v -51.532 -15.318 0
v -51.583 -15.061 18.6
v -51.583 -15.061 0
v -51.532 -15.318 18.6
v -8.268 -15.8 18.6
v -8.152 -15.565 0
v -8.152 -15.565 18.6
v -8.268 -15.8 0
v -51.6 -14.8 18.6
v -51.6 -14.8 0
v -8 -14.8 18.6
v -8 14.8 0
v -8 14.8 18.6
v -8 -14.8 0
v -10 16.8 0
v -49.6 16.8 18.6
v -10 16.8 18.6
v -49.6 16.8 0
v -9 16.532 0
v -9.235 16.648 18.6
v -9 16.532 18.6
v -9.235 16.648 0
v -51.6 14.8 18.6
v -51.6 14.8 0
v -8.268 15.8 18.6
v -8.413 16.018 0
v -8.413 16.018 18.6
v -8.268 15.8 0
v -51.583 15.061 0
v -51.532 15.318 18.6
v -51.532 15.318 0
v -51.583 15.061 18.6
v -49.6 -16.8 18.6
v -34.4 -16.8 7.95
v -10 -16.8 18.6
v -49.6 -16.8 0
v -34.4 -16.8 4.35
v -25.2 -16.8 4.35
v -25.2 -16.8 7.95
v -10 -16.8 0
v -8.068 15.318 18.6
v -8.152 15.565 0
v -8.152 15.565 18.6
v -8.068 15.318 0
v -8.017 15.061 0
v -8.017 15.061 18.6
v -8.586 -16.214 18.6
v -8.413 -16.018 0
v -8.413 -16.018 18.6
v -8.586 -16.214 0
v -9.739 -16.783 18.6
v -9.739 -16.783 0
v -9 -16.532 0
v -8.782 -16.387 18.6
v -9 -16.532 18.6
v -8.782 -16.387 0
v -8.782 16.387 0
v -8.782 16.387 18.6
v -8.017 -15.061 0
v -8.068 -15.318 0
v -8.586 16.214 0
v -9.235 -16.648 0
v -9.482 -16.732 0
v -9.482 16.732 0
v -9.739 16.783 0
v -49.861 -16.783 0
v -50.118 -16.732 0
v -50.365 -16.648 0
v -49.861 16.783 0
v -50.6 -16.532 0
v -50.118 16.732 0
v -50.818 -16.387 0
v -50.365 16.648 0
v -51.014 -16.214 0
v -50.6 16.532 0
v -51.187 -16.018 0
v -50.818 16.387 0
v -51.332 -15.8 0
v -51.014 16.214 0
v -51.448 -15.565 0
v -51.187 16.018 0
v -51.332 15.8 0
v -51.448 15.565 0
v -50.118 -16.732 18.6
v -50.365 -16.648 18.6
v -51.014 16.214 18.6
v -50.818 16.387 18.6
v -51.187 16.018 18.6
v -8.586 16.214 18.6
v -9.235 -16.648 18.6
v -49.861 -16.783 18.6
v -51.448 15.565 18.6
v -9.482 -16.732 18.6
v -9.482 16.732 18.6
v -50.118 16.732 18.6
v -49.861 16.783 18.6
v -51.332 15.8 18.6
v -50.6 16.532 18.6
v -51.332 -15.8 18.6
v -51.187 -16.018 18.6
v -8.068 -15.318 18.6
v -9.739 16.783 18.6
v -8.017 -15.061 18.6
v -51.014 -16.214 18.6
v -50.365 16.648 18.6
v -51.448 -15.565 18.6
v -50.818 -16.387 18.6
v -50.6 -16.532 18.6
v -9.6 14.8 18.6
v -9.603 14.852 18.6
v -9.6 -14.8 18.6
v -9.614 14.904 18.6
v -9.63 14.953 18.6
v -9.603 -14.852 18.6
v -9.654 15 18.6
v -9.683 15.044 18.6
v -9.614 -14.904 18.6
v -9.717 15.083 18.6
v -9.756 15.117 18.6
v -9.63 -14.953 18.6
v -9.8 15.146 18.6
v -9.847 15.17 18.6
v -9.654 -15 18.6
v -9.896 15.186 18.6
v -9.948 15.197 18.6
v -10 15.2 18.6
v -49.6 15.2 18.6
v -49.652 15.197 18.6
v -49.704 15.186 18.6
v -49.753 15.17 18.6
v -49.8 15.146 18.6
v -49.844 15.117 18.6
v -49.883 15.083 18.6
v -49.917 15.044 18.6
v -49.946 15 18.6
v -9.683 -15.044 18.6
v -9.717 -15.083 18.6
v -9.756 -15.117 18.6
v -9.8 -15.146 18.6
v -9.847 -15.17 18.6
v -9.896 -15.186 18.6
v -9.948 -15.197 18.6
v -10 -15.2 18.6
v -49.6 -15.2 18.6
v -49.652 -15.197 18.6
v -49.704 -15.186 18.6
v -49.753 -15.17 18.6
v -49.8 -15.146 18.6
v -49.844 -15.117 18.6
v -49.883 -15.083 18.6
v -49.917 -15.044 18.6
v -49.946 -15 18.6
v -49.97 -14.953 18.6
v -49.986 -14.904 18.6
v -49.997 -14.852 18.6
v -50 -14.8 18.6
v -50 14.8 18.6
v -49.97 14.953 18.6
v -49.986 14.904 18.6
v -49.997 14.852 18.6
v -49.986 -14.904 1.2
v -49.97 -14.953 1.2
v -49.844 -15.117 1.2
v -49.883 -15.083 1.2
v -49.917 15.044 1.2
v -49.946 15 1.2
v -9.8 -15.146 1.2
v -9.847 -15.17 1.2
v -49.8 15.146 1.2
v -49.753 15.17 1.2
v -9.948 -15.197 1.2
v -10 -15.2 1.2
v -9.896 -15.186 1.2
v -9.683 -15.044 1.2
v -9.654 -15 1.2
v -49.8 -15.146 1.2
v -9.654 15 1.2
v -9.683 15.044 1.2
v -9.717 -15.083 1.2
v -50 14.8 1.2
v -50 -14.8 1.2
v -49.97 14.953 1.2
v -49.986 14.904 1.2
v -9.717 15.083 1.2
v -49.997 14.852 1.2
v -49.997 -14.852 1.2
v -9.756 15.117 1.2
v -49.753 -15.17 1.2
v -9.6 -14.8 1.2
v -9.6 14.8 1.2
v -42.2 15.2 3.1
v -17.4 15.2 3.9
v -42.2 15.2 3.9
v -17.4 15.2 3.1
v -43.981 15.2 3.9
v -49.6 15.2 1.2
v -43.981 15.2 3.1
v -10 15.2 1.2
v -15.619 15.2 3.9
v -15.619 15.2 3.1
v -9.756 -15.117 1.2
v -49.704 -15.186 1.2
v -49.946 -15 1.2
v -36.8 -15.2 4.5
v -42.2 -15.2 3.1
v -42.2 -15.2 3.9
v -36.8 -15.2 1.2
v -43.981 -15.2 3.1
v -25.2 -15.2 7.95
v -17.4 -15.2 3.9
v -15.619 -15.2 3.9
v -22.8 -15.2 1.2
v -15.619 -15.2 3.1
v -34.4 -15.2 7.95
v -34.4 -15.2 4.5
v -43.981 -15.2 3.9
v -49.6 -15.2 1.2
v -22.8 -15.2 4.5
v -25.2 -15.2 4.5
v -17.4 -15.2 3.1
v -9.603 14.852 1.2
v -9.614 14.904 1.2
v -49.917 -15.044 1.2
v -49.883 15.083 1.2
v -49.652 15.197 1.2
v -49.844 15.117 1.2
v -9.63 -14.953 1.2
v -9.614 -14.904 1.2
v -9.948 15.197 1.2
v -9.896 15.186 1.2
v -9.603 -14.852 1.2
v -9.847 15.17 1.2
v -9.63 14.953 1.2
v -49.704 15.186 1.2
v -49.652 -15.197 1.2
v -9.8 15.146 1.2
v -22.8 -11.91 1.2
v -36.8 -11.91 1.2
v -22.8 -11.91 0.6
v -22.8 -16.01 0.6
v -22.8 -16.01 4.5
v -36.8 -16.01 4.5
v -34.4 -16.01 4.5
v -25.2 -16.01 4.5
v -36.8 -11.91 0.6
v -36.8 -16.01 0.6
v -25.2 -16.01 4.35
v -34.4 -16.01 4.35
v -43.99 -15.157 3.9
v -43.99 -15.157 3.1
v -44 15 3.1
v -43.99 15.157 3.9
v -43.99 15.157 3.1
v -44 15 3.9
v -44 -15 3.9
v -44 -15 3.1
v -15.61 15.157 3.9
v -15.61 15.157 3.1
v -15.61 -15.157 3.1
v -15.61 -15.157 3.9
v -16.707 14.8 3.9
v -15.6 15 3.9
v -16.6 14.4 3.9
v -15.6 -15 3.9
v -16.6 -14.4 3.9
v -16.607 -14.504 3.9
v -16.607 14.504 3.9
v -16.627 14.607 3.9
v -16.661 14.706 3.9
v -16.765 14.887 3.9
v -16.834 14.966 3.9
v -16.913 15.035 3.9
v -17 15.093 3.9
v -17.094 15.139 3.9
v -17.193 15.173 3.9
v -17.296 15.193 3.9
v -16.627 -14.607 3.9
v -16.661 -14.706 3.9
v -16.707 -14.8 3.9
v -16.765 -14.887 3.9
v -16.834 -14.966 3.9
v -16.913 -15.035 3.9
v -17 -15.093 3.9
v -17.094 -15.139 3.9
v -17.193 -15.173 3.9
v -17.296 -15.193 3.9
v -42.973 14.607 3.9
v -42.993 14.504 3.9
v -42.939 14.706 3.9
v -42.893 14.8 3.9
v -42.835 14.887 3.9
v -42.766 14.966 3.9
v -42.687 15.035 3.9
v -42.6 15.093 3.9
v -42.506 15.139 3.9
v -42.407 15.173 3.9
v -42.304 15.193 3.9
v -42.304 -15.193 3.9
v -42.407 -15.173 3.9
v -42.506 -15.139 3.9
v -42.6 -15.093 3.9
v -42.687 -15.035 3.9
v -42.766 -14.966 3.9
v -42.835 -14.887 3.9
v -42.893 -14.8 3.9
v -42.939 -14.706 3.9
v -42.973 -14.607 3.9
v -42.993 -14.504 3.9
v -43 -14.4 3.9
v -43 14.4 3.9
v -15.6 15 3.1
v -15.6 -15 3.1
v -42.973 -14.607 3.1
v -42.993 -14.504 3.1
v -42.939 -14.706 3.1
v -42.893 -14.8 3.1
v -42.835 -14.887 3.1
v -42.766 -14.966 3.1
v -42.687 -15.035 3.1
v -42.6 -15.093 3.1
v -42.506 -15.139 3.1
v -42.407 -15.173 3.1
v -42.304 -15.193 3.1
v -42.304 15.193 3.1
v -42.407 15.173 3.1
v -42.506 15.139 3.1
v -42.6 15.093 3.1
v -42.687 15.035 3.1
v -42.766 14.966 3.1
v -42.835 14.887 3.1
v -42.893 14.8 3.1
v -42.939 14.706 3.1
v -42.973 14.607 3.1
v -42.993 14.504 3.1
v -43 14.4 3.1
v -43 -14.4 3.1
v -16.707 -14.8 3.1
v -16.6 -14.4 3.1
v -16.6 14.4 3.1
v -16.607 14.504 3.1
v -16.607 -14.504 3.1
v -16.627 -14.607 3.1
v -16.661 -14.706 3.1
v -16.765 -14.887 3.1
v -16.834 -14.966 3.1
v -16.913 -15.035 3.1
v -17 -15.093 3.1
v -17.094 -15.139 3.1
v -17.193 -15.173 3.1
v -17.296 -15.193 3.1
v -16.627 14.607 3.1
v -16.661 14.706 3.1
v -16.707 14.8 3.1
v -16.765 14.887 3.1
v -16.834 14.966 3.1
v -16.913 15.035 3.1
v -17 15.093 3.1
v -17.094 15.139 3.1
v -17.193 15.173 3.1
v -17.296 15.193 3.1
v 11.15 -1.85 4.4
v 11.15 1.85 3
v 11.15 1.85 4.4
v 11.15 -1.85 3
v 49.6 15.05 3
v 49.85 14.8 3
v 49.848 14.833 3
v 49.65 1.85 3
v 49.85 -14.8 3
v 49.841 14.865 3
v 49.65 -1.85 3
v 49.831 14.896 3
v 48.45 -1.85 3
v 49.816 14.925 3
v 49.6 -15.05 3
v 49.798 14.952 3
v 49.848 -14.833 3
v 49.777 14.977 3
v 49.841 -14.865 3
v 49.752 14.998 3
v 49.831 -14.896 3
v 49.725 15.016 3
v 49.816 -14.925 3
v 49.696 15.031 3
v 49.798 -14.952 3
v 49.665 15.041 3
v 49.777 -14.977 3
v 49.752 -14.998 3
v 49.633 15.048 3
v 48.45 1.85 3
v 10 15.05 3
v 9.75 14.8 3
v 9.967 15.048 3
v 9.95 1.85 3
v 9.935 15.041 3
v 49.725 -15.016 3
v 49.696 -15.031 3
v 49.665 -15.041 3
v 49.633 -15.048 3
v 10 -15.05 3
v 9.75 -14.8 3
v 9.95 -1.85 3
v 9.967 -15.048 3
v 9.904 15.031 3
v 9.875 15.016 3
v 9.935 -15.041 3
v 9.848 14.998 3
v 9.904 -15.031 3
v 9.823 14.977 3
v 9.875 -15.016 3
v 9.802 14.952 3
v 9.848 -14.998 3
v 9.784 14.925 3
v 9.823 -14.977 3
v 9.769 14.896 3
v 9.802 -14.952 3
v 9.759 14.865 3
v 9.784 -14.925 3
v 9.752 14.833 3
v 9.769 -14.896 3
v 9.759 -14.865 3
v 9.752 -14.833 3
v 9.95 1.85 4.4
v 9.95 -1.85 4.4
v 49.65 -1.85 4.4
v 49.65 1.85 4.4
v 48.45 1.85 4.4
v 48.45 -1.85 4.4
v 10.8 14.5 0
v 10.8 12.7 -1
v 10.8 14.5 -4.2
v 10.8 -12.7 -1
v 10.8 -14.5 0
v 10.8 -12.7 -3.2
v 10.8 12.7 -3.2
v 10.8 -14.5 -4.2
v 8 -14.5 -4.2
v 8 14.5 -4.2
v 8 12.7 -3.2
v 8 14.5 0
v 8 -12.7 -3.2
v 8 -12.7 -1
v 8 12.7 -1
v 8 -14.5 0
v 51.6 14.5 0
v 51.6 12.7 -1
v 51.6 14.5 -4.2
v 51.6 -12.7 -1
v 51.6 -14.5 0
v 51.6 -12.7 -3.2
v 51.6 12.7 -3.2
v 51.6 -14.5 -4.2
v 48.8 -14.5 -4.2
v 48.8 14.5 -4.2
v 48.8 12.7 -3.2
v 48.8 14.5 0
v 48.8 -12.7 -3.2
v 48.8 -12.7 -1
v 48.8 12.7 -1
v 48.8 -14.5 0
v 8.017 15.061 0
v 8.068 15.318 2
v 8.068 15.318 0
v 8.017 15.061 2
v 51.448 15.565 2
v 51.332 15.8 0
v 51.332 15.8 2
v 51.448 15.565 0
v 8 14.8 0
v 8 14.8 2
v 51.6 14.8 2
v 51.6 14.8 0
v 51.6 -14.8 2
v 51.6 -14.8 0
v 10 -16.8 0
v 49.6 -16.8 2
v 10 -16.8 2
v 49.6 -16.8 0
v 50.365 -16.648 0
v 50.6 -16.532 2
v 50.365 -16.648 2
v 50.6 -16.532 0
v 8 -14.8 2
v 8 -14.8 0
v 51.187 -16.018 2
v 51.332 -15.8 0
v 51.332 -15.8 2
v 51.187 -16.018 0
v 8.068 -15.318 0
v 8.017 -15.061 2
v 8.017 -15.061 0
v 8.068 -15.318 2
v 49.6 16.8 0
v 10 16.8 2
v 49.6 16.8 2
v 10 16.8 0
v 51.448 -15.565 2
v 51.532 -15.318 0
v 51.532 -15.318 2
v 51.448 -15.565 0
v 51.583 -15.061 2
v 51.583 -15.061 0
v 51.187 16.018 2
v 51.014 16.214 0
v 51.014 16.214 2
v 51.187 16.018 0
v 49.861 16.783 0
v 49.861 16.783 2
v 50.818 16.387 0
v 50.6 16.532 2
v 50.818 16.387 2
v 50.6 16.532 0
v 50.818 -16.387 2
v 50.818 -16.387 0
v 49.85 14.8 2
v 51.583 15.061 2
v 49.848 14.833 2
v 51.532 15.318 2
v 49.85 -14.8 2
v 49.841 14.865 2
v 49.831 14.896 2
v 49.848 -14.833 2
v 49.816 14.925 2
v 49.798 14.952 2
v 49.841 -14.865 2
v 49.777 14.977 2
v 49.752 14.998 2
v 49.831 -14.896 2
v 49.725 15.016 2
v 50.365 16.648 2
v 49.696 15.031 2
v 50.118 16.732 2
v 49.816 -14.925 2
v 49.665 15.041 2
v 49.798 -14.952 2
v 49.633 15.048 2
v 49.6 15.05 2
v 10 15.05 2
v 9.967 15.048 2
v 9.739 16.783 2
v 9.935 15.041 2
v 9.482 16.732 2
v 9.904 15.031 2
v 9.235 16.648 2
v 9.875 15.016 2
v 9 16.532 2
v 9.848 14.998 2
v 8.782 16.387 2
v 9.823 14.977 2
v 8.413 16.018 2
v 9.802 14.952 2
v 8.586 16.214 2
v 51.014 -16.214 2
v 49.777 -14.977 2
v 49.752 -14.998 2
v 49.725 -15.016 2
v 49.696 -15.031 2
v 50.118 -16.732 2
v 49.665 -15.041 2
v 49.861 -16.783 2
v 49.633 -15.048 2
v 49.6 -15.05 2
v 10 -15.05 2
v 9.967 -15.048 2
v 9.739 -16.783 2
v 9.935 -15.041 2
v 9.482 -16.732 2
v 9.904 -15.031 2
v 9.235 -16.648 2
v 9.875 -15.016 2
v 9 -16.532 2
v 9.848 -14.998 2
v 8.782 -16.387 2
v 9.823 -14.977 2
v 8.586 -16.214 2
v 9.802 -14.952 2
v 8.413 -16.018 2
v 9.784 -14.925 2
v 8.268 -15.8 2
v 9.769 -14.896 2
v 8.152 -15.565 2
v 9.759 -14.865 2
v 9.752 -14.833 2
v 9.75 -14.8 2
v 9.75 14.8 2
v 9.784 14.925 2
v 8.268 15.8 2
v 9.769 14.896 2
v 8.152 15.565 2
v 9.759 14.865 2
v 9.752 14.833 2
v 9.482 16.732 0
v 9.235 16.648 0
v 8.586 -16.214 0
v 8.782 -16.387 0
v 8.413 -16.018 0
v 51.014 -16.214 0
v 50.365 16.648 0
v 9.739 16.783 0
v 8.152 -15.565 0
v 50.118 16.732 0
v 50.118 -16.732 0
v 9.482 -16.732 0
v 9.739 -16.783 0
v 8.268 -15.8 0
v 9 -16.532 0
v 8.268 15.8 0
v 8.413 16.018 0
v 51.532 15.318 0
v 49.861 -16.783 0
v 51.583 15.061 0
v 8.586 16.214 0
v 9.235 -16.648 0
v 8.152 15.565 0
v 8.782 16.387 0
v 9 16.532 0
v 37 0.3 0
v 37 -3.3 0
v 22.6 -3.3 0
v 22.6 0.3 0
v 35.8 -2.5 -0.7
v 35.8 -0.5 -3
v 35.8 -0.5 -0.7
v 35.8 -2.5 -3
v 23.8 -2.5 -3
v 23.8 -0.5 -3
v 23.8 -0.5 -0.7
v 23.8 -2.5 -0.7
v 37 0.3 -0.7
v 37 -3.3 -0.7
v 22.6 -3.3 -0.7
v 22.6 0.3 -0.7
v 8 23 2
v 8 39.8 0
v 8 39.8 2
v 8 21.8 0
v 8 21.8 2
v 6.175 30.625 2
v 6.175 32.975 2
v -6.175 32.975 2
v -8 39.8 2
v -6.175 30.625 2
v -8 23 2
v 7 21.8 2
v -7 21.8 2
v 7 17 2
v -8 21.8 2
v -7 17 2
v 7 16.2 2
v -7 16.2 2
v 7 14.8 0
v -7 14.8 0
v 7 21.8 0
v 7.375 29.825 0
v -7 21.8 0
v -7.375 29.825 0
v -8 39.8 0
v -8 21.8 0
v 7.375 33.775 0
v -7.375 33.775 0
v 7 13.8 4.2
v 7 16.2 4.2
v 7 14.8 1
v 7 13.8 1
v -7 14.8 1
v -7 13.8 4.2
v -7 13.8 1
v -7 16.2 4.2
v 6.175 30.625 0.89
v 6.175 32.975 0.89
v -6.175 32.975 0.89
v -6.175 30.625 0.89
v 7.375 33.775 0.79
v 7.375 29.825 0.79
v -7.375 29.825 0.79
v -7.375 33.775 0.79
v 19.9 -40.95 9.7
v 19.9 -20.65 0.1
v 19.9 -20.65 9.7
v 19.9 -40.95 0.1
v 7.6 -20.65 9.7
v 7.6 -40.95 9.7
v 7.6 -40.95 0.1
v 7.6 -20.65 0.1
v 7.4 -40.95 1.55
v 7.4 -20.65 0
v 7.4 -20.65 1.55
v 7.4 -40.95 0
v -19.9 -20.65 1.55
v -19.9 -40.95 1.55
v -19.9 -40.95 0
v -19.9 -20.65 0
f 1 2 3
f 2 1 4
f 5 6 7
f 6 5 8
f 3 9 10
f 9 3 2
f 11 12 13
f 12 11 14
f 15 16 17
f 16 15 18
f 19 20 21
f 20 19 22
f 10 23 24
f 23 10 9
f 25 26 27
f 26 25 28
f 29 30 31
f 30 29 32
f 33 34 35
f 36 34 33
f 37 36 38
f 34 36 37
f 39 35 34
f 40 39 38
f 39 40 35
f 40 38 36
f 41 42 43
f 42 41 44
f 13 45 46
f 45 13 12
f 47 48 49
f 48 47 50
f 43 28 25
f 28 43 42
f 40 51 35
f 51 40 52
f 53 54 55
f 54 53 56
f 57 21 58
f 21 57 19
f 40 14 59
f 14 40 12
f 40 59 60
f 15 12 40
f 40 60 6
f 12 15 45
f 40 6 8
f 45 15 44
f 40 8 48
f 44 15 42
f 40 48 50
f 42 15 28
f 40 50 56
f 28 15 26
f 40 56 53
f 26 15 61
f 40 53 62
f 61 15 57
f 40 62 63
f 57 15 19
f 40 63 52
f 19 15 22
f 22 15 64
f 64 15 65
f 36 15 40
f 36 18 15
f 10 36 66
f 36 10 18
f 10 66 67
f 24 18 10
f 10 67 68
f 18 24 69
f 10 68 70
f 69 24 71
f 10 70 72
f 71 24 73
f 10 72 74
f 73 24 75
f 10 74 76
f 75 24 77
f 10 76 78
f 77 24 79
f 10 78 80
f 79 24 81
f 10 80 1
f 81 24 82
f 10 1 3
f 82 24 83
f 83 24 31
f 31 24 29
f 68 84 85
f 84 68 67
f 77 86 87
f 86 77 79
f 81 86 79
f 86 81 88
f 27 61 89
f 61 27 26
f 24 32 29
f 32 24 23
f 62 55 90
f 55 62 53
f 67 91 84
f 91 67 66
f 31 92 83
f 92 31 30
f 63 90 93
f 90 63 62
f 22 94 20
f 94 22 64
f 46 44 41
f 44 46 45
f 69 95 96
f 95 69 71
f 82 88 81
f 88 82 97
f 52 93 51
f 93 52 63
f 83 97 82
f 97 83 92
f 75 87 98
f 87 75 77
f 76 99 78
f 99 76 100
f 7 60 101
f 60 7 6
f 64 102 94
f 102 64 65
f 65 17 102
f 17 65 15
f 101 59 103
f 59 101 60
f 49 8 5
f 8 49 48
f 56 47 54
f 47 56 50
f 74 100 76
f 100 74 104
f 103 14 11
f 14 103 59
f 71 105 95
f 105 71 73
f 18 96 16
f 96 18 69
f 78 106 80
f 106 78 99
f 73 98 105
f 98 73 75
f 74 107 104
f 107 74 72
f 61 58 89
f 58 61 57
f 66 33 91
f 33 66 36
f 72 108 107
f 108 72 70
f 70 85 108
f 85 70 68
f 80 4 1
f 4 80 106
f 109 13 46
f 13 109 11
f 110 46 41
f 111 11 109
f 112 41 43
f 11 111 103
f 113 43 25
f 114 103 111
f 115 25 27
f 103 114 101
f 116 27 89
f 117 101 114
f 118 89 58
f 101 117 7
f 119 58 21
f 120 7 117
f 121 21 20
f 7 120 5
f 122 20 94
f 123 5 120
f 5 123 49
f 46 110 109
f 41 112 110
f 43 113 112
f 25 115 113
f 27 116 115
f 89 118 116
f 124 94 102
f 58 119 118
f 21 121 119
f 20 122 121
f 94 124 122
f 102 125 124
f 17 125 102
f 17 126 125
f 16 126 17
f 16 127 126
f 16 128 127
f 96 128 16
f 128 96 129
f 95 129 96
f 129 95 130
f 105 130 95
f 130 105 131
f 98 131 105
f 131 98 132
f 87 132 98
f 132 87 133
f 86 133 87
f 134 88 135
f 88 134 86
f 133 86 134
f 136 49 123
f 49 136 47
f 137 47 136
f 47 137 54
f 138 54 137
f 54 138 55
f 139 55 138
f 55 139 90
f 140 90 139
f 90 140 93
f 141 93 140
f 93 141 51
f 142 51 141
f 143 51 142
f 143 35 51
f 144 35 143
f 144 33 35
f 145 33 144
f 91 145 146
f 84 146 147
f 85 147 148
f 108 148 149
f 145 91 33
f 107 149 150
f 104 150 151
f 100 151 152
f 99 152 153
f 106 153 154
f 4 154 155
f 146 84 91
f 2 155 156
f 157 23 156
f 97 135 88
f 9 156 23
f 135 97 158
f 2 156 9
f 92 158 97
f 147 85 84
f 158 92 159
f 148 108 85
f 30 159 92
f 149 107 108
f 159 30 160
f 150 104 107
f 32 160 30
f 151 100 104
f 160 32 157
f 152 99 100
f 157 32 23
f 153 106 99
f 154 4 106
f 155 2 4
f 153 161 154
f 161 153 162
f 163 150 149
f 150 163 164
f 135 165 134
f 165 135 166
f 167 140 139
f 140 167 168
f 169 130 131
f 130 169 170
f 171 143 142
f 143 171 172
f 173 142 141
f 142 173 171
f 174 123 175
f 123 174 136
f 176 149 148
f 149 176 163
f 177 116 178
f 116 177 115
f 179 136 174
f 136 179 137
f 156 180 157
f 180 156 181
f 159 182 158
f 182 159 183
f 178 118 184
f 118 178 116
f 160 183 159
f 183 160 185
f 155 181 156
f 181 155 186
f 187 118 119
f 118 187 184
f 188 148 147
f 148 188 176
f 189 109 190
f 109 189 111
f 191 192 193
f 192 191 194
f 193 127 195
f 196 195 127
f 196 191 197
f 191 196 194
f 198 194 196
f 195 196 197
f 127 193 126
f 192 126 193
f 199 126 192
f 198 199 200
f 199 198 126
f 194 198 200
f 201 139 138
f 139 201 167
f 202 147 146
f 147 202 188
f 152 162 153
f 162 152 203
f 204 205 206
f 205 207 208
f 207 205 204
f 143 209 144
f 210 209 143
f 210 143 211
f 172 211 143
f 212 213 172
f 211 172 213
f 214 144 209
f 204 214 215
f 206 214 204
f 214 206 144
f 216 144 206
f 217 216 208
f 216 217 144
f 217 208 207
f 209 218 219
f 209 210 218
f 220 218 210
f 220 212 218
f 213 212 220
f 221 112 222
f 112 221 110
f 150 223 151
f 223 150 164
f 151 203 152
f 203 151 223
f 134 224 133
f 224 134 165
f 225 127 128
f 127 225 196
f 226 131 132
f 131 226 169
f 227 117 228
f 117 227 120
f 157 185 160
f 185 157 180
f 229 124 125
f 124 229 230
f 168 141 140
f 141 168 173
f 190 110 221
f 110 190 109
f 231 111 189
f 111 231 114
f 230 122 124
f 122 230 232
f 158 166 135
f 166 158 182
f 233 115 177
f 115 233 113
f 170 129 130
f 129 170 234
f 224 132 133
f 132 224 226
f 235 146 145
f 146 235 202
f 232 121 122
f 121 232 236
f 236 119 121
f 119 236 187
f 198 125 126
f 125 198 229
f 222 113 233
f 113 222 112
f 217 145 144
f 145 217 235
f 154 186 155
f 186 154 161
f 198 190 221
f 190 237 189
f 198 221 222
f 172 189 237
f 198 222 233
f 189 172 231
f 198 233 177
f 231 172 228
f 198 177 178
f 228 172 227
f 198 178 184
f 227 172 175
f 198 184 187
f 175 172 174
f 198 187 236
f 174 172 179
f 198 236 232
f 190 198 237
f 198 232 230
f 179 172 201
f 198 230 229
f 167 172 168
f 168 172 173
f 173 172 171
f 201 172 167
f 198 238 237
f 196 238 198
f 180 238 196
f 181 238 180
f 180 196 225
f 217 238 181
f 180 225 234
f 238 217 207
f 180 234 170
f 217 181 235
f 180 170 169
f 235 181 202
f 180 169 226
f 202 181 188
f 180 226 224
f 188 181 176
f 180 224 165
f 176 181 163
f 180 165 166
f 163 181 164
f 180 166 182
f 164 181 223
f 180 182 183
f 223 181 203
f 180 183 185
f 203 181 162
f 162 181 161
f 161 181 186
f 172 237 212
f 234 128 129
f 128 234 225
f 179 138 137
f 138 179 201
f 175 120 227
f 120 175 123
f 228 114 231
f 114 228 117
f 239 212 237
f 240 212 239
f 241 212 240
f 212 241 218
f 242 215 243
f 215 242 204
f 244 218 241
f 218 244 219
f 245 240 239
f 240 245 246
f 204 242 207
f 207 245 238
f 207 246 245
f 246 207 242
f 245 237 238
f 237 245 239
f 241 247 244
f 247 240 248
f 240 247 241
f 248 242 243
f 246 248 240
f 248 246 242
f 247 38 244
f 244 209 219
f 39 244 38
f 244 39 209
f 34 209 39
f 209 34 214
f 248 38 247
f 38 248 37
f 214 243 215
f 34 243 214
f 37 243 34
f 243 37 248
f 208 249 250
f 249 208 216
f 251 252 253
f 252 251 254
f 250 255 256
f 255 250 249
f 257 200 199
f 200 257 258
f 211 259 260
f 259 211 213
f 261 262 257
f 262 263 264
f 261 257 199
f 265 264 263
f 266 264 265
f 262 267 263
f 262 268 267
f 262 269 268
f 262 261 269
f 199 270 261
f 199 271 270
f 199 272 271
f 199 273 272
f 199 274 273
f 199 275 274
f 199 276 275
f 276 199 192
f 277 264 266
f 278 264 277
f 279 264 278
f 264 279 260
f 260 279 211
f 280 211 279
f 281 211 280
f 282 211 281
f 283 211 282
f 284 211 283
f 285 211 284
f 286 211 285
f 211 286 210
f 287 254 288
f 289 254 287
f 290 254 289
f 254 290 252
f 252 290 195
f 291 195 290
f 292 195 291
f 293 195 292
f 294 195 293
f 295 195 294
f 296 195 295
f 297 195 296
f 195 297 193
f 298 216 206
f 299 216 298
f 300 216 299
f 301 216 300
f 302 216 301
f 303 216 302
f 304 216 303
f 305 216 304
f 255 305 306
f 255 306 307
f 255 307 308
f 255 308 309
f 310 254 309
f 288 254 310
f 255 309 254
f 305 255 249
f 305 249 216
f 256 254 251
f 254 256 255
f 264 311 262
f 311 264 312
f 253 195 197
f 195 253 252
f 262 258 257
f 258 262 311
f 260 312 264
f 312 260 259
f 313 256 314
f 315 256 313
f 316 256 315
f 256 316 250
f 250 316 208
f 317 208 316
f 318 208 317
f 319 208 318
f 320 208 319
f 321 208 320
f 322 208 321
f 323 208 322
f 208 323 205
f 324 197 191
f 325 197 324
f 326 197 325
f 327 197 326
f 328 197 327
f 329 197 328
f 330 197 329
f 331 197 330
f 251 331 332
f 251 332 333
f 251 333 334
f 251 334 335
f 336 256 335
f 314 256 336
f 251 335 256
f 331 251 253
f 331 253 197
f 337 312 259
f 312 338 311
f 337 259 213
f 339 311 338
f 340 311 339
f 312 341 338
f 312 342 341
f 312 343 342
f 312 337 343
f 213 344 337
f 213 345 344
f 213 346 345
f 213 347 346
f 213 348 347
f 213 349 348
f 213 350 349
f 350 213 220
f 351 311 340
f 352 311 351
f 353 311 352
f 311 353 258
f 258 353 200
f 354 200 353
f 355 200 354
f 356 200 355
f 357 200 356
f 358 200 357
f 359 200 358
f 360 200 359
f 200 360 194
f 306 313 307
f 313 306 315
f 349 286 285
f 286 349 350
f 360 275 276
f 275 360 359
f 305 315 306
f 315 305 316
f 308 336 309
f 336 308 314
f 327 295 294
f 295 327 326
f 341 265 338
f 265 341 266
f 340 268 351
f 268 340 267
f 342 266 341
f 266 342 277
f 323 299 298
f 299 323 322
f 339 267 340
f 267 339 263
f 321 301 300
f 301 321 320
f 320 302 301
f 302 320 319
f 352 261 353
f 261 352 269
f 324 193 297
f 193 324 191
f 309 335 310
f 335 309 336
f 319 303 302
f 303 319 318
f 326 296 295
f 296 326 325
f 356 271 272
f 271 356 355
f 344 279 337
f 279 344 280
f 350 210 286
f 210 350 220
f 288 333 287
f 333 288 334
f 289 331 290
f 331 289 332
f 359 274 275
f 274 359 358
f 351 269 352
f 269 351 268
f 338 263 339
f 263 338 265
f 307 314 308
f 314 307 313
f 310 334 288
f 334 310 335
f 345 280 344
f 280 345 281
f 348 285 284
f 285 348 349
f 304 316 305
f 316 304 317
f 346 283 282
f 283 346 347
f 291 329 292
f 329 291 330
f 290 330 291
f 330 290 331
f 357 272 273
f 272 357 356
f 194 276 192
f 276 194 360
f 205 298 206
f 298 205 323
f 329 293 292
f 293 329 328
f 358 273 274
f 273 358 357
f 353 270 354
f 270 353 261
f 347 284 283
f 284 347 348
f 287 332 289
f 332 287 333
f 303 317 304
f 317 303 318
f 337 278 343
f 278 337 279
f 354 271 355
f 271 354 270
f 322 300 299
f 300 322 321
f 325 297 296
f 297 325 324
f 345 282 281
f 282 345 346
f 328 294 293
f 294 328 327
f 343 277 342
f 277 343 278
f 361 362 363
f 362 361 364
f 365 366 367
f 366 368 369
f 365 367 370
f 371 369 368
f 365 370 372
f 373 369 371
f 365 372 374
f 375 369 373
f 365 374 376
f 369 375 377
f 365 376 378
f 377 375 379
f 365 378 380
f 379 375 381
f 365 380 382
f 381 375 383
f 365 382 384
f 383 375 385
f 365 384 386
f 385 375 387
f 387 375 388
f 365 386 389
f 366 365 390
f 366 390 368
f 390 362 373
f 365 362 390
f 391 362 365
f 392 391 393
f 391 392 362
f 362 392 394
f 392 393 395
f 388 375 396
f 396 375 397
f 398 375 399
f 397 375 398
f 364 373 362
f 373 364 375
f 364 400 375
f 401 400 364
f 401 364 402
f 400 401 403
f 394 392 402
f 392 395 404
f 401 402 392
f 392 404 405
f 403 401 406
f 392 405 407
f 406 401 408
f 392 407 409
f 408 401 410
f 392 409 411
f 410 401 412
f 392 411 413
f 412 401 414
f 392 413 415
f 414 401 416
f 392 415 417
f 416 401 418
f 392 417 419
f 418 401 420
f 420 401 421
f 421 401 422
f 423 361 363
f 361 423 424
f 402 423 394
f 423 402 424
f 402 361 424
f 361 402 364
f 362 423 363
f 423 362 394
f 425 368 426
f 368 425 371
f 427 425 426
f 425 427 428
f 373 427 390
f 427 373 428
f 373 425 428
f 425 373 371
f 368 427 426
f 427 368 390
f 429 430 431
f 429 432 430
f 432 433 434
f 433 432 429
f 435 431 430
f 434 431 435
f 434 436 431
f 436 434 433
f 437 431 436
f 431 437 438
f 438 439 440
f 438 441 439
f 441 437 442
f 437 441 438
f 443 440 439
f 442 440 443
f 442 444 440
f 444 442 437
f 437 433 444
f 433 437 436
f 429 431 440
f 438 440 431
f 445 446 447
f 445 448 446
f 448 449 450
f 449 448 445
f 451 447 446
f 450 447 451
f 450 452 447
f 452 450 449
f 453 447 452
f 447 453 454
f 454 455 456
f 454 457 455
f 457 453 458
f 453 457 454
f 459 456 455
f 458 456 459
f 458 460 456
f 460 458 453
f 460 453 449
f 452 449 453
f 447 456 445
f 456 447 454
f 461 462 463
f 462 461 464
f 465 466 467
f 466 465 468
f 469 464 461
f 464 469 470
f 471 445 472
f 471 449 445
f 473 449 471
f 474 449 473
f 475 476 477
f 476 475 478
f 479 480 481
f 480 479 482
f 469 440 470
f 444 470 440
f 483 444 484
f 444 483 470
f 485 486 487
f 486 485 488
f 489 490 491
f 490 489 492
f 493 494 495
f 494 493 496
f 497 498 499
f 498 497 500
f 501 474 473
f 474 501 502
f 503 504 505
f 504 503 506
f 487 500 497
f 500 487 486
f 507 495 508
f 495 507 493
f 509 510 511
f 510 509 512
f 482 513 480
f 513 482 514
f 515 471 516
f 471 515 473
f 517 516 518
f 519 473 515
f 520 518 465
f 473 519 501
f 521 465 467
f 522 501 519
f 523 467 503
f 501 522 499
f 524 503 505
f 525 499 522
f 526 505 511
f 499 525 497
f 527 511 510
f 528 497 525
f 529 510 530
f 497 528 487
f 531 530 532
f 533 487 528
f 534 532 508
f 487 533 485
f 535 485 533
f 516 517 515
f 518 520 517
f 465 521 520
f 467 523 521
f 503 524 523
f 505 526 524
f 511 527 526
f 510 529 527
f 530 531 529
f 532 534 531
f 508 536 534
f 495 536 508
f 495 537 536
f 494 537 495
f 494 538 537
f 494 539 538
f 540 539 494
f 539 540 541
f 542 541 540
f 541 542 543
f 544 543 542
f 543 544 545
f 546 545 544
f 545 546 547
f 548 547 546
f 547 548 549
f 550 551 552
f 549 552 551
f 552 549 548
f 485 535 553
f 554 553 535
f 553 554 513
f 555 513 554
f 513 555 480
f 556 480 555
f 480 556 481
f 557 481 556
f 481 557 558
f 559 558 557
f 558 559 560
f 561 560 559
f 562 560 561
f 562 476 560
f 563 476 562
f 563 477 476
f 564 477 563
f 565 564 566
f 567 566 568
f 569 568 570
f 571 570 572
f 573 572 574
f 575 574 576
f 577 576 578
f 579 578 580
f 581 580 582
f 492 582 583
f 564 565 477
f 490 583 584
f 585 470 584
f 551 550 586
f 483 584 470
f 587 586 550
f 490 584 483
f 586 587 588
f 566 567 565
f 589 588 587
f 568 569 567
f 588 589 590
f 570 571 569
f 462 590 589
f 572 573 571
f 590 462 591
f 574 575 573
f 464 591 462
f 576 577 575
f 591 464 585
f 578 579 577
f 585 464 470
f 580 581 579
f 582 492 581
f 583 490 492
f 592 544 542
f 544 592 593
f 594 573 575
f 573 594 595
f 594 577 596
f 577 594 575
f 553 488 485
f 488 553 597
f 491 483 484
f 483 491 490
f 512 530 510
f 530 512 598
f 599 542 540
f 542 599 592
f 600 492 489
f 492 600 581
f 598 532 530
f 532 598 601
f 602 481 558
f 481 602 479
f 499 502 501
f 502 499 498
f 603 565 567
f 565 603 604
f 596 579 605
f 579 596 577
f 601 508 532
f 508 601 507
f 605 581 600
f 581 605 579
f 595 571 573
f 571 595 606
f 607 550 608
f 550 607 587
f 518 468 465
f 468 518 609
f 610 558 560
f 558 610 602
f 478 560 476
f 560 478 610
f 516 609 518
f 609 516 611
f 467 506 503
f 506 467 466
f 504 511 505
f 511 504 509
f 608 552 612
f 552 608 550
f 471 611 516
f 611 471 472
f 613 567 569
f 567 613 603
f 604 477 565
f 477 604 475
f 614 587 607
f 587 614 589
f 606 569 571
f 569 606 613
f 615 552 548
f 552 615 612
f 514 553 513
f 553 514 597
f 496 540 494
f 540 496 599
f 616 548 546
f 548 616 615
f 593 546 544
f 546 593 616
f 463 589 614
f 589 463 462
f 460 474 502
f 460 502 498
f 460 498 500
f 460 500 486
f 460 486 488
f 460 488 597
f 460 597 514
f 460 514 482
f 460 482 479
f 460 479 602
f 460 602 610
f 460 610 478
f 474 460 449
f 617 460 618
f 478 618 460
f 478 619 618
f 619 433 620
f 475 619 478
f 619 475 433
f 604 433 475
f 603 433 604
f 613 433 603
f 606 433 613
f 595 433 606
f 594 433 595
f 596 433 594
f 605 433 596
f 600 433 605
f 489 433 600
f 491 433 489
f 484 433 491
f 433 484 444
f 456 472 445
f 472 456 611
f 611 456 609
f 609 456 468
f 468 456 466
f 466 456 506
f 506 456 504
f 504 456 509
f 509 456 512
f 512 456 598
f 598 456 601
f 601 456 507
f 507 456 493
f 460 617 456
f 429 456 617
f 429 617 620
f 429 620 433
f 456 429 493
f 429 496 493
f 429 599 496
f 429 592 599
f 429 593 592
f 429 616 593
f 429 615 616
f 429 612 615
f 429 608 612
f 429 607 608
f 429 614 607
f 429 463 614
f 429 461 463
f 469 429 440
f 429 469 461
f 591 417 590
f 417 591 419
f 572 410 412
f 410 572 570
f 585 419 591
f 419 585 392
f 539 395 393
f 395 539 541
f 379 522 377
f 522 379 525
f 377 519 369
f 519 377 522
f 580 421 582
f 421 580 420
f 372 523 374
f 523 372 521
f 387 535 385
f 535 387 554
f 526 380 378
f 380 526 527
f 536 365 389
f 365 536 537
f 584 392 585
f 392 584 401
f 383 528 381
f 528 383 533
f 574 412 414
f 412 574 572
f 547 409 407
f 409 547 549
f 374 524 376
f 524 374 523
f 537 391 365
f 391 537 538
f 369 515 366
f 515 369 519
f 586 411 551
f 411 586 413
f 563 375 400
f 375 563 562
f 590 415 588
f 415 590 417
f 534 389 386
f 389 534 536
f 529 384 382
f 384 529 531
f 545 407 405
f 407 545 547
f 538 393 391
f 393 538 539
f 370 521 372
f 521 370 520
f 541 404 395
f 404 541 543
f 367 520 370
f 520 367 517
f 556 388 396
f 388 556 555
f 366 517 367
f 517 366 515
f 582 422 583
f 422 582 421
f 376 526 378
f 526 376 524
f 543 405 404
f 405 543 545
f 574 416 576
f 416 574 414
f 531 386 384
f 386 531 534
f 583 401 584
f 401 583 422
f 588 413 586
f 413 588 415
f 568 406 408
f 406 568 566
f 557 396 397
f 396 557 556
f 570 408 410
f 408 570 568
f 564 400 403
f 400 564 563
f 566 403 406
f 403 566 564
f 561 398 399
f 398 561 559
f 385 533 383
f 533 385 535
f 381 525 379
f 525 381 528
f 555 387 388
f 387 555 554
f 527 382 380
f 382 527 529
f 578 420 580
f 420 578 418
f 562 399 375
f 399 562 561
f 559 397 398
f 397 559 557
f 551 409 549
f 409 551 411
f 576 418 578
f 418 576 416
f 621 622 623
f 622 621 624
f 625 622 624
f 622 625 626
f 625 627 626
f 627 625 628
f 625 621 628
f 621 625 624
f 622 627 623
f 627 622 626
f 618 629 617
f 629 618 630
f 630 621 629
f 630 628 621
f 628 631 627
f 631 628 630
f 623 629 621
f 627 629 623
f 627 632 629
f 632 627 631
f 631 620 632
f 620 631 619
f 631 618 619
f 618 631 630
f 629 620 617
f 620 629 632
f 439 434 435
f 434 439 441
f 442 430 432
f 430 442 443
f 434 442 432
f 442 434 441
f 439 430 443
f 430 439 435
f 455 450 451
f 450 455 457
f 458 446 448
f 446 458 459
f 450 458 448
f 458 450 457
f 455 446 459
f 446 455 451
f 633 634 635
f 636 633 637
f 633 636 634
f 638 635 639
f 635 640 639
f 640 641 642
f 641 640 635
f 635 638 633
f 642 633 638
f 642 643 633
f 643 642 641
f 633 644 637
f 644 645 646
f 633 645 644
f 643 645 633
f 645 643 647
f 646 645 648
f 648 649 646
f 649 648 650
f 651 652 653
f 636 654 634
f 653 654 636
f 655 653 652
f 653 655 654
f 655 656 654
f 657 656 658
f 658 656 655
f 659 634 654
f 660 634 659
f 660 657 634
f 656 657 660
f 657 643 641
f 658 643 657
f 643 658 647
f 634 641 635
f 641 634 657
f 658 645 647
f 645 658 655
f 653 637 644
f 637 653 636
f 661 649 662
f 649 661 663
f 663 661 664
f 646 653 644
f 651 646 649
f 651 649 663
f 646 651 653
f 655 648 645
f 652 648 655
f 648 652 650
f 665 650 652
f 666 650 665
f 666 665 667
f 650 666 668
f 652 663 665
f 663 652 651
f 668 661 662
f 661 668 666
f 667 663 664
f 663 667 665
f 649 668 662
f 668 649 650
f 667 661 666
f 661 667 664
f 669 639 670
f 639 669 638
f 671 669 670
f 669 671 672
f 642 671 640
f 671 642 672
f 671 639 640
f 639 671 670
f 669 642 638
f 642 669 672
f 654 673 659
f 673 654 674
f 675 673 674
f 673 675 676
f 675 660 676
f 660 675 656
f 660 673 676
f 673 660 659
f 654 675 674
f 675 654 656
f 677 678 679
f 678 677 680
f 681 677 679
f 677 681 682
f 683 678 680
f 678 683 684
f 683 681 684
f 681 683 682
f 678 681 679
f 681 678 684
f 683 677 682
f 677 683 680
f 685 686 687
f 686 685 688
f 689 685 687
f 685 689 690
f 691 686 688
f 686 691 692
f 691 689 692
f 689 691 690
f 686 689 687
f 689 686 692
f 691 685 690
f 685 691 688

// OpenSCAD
// Gotcha Six wearable enclosure
// C4001 mmWave + Seeed XIAO nRF52840 Sense + LiPo (A or B)
//
// part: "shell" | "back" | "clip" | "shim" | "all"
// battery: "A" (500 mAh) | "B" (800 mAh) — affects shim only
//
// Units: millimetres. Origin at the outer front face, centred on X/Y.

part = "all";
battery = "A";
band_width = 25;

/* [Hidden] */
$fn = 48;

// --- Components ---
radar_w = 26.00;
radar_h = 30.00;
radar_z = 2.70;

xiao_bay_z = 4.50;

batt_a_l = 27.50;
batt_a_z = 8.25;

batt_b_short = 17.80;

// --- Shell sizing ---
wall = 1.60;
window_t = 1.20;
corner_r = 2.00;
fit = 0.40;

batt_bay_l = 40.00;
batt_bay_w = 20.50;
batt_bay_z = 9.80;
batt_clear = 0.40;

wire_notch_w = 14.00;
wire_notch_h = 2.50;
wire_notch_d = 1.20;

usb_slot_w = 9.20;
usb_slot_h = 3.60;

snap_w = 4.00;
snap_d = 1.20;
snap_h = 1.40;

band_slot_t = 2.20;
band_bridge = 2.00;
clip_rail_w = 12.00;
clip_rail_t = 2.00;
clip_rail_h = 3.00;
clip_gap = 2.20;
clip_jaw = 8.00;
clip_thick = 2.00;

inner_w = max(radar_w + fit, batt_bay_l + batt_clear);
inner_h = max(radar_h + fit, band_width + 2 * band_bridge);
outer_w = inner_w + 2 * wall;
outer_h = inner_h + 2 * wall;

cavity_z = radar_z + xiao_bay_z + batt_bay_z + batt_clear;
shell_z = window_t + cavity_z;
back_plate_t = 2.00;

module rounded_rect(size, r) {
  w = size[0];
  h = size[1];
  rr = min(r, w / 2, h / 2);
  hull() {
    for (sx = [-1, 1], sy = [-1, 1])
      translate([sx * (w / 2 - rr), sy * (h / 2 - rr)])
        circle(r = rr);
  }
}

module rounded_box(size, r) {
  linear_extrude(height = size[2])
    rounded_rect([size[0], size[1]], r);
}

function tunnel_outer_h() = band_width + 2 * band_bridge;

module shell() {
  difference() {
    rounded_box([outer_w, outer_h, shell_z], corner_r);

    // Main cavity above the window
    translate([0, 0, window_t])
      linear_extrude(height = cavity_z + 0.02)
        rounded_rect([inner_w, inner_h], max(0.1, corner_r - wall));

    // Wire notch on bottom edge (radar header edge)
    translate([
      0,
      -inner_h / 2 + wire_notch_h / 2 - 0.01,
      window_t + radar_z / 2
    ])
      cube([wire_notch_w, wire_notch_h + wall, wire_notch_d + radar_z], center = true);

    // USB-C slot on bottom wall through the XIAO bay
    usb_z_mid = window_t + radar_z + xiao_bay_z / 2;
    translate([0, -outer_h / 2 + wall / 2, usb_z_mid])
      cube([usb_slot_w, wall + 0.2, usb_slot_h], center = true);

    // Snap seats on the open end
    for (sx = [-1, 1])
      translate([
        sx * (inner_w / 2 - snap_d / 2 - 0.2),
        0,
        shell_z - snap_h / 2
      ])
        cube([snap_d + 0.2, snap_w, snap_h + 0.2], center = true);
  }

  // Radar retaining lip
  lip_t = 0.80;
  lip_in = 1.00;
  difference() {
    translate([0, 0, window_t + radar_z - lip_t])
      linear_extrude(height = lip_t)
        rounded_rect([radar_w + fit + 2 * lip_in, radar_h + fit + 2 * lip_in], 1.2);
    translate([0, 0, window_t + radar_z - lip_t - 0.01])
      linear_extrude(height = lip_t + 0.02)
        rounded_rect([radar_w + fit, radar_h + fit], 0.8);
    translate([0, -radar_h / 2, window_t + radar_z - lip_t / 2])
      cube([wire_notch_w + 2, 6, lip_t + 0.2], center = true);
  }
}

module back() {
  // Body-face features point +Z. Shell inserts point -Z.
  difference() {
    union() {
      rounded_box([outer_w, outer_h, back_plate_t], corner_r);

      translate([0, 0, -1.00])
        linear_extrude(height = 1.00)
          rounded_rect([inner_w - 0.30, inner_h - 0.30], max(0.1, corner_r - wall - 0.15));

      for (sx = [-1, 1])
        translate([
          sx * (inner_w / 2 - snap_d / 2 - 0.35),
          0,
          -1.00 - snap_h / 2
        ])
          cube([snap_d, snap_w - 0.30, snap_h], center = true);

      // Clip rail
      translate([0, 1.5, back_plate_t + clip_rail_h / 2])
        cube([clip_rail_w, clip_rail_t, clip_rail_h], center = true);
      translate([0, 1.5, back_plate_t + 0.70 / 2])
        cube([clip_rail_w + 2.40, clip_rail_t + 1.60, 0.70], center = true);

      // Band tunnel housings
      for (sx = [-1, 1])
        translate([
          sx * (outer_w / 2 - (band_bridge + 0.8) / 2),
          0,
          back_plate_t + (band_slot_t + band_bridge) / 2
        ])
          cube([band_bridge + 0.8, tunnel_outer_h(), band_slot_t + band_bridge], center = true);
    }

    for (sx = [-1, 1])
      translate([
        sx * (outer_w / 2 - (band_bridge + 0.8) / 2),
        0,
        back_plate_t + band_bridge / 2 + band_slot_t / 2
      ])
        cube([band_bridge + 1.2, band_width + 0.4, band_slot_t], center = true);
  }
}

module clip() {
  body_l = 18.00;
  body_w = clip_rail_w + 4.00;
  body_t = clip_thick;

  difference() {
    union() {
      translate([0, 0, body_t / 2])
        cube([body_w, body_l, body_t], center = true);

      translate([0, -body_l / 2 - clip_jaw / 2 + 1, body_t / 2])
        cube([body_w - 2, clip_jaw, body_t], center = true);

      translate([0, -body_l / 2 - clip_jaw + 1.2, body_t / 2 + (clip_gap + 1.0) / 2])
        cube([body_w - 2, 2.40, clip_gap + 1.0], center = true);
    }

    translate([0, 1.0, body_t - 0.01])
      cube([clip_rail_w + 0.35, clip_rail_t + 0.35, body_t + 0.2], center = true);
    translate([0, 1.0, 0.70 / 2 - 0.01])
      cube([clip_rail_w + 2.75, clip_rail_t + 1.95, 0.70 + 0.2], center = true);

    translate([0, -body_l / 2 - clip_jaw / 2 + 2.2, body_t + clip_gap / 2])
      cube([body_w, clip_jaw - 2, clip_gap], center = true);
  }
}

module shim_a() {
  end_block = batt_bay_l - batt_a_l; // 12.5
  pad_z = batt_bay_z - batt_a_z;     // 1.55
  translate([(batt_bay_l - end_block) / 2, 0, batt_bay_z / 2])
    cube([end_block - 0.2, batt_bay_w - 0.2, batt_bay_z - 0.2], center = true);
  translate([-end_block / 2, 0, pad_z / 2])
    cube([batt_a_l - 0.2, batt_bay_w - 0.2, pad_z], center = true);
}

module shim_b() {
  bar = batt_bay_w - batt_b_short; // 2.7
  translate([0, (batt_bay_w - bar) / 2, batt_bay_z / 2])
    cube([batt_bay_l - 0.2, bar - 0.2, batt_bay_z - 0.2], center = true);
}

module shim() {
  if (battery == "A")
    shim_a();
  else if (battery == "B")
    shim_b();
  else
    assert(false, "battery must be \"A\" or \"B\"");
}

module plate_all() {
  translate([-outer_w / 2 - 8, 0, 0])
    shell();
  translate([outer_w / 2 + 8, 0, back_plate_t])
    rotate([180, 0, 0])
      back();
  translate([0, outer_h / 2 + 14, 0])
    clip();
  translate([0, -outer_h / 2 - 14, 0])
    shim();
}

if (part == "shell")
  shell();
else if (part == "back")
  rotate([180, 0, 0])
    back();
else if (part == "clip")
  clip();
else if (part == "shim")
  shim();
else if (part == "all")
  plate_all();
else
  assert(false, "part must be shell|back|clip|shim|all");

echo(str("outer_w=", outer_w));
echo(str("outer_h=", outer_h));
echo(str("shell_z=", shell_z));
echo(str("inner_w=", inner_w));
echo(str("inner_h=", inner_h));
echo(str("cavity_z=", cavity_z));
echo(str("batt_bay=", batt_bay_l, "x", batt_bay_w, "x", batt_bay_z));
echo(str("usb_slot=", usb_slot_w, "x", usb_slot_h));
echo(str("shim_A_end=", batt_bay_l - batt_a_l, " pad_z=", batt_bay_z - batt_a_z));
echo(str("shim_B_bar=", batt_bay_w - batt_b_short));
